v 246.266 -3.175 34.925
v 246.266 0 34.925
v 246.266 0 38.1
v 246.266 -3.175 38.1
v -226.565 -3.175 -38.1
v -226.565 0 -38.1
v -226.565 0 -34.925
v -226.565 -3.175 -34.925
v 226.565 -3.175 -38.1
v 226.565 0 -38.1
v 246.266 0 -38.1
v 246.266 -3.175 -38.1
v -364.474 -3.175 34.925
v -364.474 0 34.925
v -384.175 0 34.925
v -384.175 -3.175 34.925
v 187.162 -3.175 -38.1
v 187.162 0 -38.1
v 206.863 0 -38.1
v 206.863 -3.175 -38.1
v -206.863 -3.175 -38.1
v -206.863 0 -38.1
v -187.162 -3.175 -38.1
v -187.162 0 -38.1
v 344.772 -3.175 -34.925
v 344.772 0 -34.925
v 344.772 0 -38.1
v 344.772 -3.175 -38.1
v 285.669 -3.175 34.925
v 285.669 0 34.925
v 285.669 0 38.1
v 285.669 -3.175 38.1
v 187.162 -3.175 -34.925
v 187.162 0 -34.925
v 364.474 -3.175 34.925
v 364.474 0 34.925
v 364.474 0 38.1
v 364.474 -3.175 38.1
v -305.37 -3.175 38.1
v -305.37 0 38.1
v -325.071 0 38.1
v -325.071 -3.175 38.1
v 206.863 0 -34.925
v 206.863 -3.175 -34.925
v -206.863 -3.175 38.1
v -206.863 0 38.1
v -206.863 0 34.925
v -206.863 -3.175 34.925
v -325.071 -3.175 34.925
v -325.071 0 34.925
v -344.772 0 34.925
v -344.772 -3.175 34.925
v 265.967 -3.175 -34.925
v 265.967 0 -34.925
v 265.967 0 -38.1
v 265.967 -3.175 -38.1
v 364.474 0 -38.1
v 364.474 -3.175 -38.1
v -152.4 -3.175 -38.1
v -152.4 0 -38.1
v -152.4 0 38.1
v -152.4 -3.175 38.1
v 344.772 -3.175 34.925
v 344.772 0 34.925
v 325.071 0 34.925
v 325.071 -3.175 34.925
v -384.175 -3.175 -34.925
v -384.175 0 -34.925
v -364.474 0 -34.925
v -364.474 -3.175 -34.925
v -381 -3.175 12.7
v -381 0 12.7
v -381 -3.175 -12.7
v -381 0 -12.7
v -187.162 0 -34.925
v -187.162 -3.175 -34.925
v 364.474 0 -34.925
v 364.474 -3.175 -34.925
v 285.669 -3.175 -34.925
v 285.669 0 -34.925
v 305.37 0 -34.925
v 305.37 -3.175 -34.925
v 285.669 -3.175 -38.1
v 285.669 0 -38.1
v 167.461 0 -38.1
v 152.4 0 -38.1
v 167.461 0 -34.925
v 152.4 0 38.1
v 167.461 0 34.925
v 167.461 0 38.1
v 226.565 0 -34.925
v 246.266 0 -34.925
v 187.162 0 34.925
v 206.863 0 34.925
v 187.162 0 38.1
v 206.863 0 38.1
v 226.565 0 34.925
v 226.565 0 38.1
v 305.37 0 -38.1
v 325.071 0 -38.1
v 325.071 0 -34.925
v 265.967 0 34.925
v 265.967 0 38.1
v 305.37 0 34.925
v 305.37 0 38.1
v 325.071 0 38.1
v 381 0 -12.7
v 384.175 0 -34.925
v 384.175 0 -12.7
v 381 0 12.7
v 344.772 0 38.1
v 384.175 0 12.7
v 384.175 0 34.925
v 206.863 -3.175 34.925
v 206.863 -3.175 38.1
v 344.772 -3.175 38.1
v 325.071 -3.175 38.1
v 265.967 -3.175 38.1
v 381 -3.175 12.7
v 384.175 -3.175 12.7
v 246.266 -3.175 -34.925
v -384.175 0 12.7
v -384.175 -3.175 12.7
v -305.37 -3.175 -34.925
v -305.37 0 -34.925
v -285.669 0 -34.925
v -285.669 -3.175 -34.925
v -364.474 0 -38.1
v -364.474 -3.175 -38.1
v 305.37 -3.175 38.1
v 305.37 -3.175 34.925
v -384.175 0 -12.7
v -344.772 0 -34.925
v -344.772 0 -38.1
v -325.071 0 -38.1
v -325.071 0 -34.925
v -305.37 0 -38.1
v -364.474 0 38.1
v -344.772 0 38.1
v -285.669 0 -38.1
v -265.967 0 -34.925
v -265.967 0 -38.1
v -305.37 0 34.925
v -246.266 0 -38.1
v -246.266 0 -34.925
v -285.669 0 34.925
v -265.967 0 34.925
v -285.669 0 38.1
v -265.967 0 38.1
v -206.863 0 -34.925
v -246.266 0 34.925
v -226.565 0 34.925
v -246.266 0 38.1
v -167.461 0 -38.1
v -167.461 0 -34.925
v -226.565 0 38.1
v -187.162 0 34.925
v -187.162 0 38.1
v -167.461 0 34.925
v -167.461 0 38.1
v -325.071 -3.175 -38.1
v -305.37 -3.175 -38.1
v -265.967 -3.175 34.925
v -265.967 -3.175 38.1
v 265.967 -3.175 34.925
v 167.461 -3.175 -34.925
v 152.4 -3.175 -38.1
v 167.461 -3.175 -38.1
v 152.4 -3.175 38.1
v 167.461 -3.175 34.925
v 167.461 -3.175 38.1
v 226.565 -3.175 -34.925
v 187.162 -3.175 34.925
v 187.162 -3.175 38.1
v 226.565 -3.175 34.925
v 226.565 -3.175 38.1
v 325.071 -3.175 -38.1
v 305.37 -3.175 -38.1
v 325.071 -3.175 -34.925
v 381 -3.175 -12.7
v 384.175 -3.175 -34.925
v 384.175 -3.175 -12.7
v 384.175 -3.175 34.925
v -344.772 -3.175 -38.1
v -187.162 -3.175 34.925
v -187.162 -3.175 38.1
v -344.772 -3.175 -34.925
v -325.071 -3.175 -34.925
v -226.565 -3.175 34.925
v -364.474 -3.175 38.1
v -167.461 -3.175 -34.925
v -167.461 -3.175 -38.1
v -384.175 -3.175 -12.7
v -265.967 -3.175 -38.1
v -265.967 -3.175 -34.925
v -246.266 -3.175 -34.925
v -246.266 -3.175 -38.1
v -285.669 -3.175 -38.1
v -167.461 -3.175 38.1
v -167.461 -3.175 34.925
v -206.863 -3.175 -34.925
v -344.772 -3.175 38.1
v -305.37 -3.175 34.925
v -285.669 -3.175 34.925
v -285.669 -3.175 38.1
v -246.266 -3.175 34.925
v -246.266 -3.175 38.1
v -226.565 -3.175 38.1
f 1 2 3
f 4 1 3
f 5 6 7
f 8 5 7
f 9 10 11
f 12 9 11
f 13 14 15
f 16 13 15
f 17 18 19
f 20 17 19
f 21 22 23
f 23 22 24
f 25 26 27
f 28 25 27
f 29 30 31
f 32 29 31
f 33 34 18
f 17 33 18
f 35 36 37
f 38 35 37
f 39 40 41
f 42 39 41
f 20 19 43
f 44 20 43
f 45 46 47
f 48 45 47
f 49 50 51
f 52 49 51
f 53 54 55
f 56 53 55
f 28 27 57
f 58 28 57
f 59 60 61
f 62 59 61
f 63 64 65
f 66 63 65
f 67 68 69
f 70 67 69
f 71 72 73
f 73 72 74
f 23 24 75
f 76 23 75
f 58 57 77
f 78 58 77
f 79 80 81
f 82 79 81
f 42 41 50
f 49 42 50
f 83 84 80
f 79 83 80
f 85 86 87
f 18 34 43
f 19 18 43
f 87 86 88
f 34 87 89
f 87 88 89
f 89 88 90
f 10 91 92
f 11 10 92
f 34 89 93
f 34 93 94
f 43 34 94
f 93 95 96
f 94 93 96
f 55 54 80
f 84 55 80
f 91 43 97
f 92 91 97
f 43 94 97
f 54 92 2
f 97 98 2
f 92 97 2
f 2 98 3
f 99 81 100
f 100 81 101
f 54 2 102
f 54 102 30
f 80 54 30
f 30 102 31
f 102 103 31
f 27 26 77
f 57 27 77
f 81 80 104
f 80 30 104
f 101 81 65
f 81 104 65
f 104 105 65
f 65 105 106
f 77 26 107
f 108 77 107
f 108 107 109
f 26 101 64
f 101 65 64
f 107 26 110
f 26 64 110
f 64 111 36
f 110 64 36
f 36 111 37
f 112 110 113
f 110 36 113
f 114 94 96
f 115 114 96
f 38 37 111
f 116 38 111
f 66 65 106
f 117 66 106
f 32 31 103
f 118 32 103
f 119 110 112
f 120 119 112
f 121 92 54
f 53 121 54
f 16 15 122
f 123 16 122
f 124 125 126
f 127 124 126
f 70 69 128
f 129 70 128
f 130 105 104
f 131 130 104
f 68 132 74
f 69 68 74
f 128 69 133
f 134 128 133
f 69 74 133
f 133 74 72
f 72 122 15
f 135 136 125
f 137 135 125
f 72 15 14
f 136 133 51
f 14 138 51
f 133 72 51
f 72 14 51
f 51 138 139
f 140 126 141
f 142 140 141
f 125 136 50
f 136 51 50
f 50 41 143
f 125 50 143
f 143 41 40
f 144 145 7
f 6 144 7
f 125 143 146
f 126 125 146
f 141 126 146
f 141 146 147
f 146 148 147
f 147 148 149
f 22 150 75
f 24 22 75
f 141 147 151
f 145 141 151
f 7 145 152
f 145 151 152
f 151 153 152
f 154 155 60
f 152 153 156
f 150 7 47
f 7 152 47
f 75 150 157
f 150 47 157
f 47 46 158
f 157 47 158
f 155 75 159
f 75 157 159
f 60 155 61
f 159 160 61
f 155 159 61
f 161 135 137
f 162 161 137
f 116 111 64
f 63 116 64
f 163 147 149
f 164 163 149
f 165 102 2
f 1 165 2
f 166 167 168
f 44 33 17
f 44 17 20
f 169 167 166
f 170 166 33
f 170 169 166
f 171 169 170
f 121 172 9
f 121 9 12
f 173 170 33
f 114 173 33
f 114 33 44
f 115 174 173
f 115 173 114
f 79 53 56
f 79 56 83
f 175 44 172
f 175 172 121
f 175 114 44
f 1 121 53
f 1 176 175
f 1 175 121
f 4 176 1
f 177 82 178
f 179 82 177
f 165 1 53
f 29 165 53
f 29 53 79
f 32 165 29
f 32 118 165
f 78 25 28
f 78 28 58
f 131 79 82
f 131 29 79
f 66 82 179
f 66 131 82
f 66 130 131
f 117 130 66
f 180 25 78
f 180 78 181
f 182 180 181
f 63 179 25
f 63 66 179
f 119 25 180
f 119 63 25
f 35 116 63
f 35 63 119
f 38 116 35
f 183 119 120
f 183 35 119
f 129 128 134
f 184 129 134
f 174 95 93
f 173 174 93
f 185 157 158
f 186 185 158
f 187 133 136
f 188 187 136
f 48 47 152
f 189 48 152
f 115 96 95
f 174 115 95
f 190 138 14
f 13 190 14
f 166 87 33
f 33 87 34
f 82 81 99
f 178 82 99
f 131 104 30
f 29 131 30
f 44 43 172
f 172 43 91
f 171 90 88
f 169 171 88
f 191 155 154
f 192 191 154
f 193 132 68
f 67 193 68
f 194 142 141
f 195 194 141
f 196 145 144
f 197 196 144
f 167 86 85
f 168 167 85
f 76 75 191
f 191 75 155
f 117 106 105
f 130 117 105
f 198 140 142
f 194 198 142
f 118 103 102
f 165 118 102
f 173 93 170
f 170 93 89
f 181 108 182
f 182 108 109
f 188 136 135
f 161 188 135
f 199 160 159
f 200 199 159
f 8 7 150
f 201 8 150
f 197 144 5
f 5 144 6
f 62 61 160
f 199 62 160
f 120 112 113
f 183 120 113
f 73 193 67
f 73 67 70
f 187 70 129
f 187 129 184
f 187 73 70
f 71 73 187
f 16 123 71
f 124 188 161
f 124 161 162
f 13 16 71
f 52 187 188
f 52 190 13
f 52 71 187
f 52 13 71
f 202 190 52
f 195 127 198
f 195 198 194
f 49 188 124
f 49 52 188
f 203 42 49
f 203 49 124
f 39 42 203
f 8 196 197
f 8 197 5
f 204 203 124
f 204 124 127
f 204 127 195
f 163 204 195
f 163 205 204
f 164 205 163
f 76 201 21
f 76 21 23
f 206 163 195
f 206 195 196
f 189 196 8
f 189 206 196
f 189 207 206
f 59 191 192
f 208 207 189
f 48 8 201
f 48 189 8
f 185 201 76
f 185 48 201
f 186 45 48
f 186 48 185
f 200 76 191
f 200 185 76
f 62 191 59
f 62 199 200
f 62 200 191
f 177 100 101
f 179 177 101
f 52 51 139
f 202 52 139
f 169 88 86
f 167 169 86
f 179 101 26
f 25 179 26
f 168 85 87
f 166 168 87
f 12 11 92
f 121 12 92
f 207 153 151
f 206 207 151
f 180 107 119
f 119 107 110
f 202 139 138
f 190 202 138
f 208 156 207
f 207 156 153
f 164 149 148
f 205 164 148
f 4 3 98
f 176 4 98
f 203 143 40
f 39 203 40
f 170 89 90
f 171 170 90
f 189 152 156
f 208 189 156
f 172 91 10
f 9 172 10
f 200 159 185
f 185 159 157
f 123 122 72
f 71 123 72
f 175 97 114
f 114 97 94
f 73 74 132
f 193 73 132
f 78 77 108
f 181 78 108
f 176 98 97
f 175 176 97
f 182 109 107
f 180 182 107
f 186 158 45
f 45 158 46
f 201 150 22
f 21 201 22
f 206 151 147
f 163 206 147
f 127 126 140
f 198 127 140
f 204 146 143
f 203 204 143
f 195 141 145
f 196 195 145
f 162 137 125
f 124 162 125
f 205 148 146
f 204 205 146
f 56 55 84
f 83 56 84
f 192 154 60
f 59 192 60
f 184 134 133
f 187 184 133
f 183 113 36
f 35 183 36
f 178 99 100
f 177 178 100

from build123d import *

# Parameters (mm, degrees)
F1_DEPTH = 3.175


# Not quite as in the source:
# - ends of sketch curves that miss each other by under 0.0002 mm in the source are joined


with BuildPart() as f1:
    # F0 (on Front) → F1 (new body)
    with BuildSketch(Plane.XZ):
        Polygon((-384.175, 34.925), (-384.175, 12.7), (-381, 12.7), (-381, -12.7), (-384.175, -12.7), (-384.175, -34.925), (-364.473717838, -34.925), (-364.473717838, -38.1), (-344.772435676, -38.1), (-344.772435676, -34.925), (-325.071153514, -34.925), (-325.071153514, -38.1), (-305.369871352, -38.1), (-305.369871352, -34.925), (-285.66858919, -34.925), (-285.66858919, -38.1), (-265.967307028, -38.1), (-265.967307028, -34.925), (-246.266024866, -34.925), (-246.266024866, -38.1), (-226.564742704, -38.1), (-226.564742704, -34.925), (-206.863460542, -34.925), (-206.863460542, -38.1), (-187.16217838, -38.1), (-187.16217838, -34.925), (-167.460896218, -34.925), (-167.460896218, -38.1), (-152.4, -38.1), (-152.4, 38.1), (-167.460896218, 38.1), (-167.460896218, 34.925), (-187.16217838, 34.925), (-187.16217838, 38.1), (-206.863460542, 38.1), (-206.863460542, 34.925), (-226.564742704, 34.925), (-226.564742704, 38.1), (-246.266024866, 38.1), (-246.266024866, 34.925), (-265.967307028, 34.925), (-265.967307028, 38.1), (-285.66858919, 38.1), (-285.66858919, 34.925), (-305.369871352, 34.925), (-305.369871352, 38.1), (-325.071153514, 38.1), (-325.071153514, 34.925), (-344.772435676, 34.925), (-344.772435676, 38.1), (-364.473717838, 38.1), (-364.473717838, 34.925), align=None)
    extrude(amount=F1_DEPTH)


with BuildPart() as f1b:
    # F0 (on Front) → F1, piece 2 (new body)
    with BuildSketch(Plane.XZ):
        Polygon((167.460900536, 38.1), (152.4, 38.1), (152.4, -38.1), (167.460900536, -38.1), (167.460900536, -34.925), (187.162182698, -34.925), (187.162182698, -38.1), (206.86346486, -38.1), (206.86346486, -34.925), (226.564747022, -34.925), (226.564747022, -38.1), (246.266029184, -38.1), (246.266029184, -34.925), (265.967311346, -34.925), (265.967311346, -38.1), (285.668593508, -38.1), (285.668593508, -34.925), (305.36987567, -34.925), (305.36987567, -38.1), (325.071157832, -38.1), (325.071157832, -34.925), (344.772439994, -34.925), (344.772439994, -38.1), (364.473722156, -38.1), (364.473722156, -34.925), (384.175004318, -34.925), (384.175, -12.7), (381, -12.7), (381, 12.7), (384.175, 12.7), (384.175, 34.925), (364.473722156, 34.925), (364.473722156, 38.1), (344.772439994, 38.1), (344.772439994, 34.925), (325.071157832, 34.925), (325.071157832, 38.1), (305.36987567, 38.1), (305.36987567, 34.925), (285.668593508, 34.925), (285.668593508, 38.1), (265.967311346, 38.1), (265.967311346, 34.925), (246.266029184, 34.925), (246.266029184, 38.1), (226.564747022, 38.1), (226.564747022, 34.925), (206.86346486, 34.925), (206.86346486, 38.1), (187.162182698, 38.1), (187.162182698, 34.925), (167.460900536, 34.925), align=None)
    extrude(amount=F1_DEPTH)


solid = Compound([f1.part, f1b.part])
